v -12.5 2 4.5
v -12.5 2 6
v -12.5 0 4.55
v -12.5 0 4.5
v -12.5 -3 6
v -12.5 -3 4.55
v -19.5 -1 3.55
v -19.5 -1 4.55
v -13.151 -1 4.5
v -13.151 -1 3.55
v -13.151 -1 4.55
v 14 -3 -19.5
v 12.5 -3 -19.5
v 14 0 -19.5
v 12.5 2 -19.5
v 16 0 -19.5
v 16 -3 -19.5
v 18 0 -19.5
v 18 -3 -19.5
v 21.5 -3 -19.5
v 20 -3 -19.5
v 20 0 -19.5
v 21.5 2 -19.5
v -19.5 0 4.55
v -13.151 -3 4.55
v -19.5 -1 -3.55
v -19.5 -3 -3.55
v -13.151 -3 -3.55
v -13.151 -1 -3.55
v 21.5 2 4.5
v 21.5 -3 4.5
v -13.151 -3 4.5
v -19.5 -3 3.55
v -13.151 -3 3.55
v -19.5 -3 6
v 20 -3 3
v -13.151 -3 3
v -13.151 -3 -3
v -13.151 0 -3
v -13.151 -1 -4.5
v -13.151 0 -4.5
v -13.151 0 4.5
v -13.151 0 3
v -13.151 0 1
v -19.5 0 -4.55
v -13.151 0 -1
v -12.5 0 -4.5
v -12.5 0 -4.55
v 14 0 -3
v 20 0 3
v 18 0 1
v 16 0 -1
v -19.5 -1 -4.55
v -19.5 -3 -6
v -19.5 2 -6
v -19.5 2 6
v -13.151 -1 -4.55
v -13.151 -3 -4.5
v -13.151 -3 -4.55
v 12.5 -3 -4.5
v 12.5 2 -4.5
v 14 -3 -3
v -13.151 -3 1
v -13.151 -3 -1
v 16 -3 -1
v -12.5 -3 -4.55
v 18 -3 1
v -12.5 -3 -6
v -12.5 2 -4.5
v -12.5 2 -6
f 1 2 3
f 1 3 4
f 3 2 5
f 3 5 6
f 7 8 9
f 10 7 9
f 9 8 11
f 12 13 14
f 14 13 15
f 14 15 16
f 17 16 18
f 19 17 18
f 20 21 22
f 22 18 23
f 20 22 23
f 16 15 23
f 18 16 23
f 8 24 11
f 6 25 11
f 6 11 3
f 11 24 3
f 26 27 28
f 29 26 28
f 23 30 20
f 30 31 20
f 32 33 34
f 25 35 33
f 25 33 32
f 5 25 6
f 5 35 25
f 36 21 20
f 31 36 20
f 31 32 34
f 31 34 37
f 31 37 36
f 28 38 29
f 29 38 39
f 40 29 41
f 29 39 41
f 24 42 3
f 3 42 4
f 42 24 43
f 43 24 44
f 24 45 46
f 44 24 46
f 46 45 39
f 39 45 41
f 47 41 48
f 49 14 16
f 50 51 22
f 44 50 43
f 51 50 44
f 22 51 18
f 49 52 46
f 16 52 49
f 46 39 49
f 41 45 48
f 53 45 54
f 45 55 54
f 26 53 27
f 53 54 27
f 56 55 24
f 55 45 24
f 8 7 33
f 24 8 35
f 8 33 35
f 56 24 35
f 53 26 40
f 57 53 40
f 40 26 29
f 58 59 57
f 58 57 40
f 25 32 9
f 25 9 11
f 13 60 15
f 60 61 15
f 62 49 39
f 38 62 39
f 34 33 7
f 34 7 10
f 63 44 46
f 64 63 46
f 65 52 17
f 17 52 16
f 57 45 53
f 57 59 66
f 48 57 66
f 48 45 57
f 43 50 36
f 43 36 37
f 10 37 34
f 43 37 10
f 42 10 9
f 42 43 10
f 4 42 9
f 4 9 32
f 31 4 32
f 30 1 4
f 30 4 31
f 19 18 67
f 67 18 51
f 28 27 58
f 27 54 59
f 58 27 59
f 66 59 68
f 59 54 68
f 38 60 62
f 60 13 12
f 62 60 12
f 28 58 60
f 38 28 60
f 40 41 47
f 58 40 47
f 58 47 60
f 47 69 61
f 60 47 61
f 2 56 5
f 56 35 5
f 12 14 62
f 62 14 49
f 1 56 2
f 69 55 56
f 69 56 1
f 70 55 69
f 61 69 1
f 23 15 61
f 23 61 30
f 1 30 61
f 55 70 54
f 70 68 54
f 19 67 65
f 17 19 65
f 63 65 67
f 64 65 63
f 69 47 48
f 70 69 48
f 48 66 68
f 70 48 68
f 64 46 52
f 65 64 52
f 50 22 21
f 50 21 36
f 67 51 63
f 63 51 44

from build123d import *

# Parameters (mm, degrees)
BOSS_EXTRUDE1_DEPTH = 2
SKETCH2_W           = 7
SKETCH2_H           = 1.45
BOSS_EXTRUDE2_DEPTH = 3
SKETCH3_W           = 6.349281592
SKETCH3_H           = 1
BOSS_EXTRUDE3_DEPTH = 2


with BuildPart() as part:
    # Sketch1 → Boss-Extrude1 (new body)
    with BuildSketch(Plane(origin=(0, 0, 0), x_dir=(1, 0, 0), z_dir=(0, 1, 0))):
        Polygon((12.5, -4.5), (21.5, -4.5), (21.5, 19.5), (12.5, 19.5), (12.5, 4.5), (-12.5, 4.5), (-12.5, 6), (-19.5, 6), (-19.5, -6), (-12.5, -6), (-12.5, -4.5), align=None)
    extrude(amount=BOSS_EXTRUDE1_DEPTH)

    # Sketch2 → Boss-Extrude2 (add)
    with BuildSketch(Plane(origin=(0, 0, 0), x_dir=(1, 0, 0), z_dir=(0, 1, 0))):
        Polygon((-13.150718408, 4.5), (12.5, 4.5), (12.5, 19.5), (14, 19.5), (14, 3), (-13.150718408, 3), align=None)
        Polygon((20, 19.5), (20, -3), (-13.150718408, -3), (-13.150718408, -4.5), (21.5, -4.5), (21.5, 19.5), align=None)
        Polygon((-13.150718408, 1), (16, 1), (16, 19.5), (18, 19.5), (18, -1), (-13.150718408, -1), align=None)
        with Locations((-16, 5.275)):
            Rectangle(SKETCH2_W, SKETCH2_H)
        with Locations((-16, -5.275)):
            Rectangle(SKETCH2_W, SKETCH2_H)
    extrude(amount=-BOSS_EXTRUDE2_DEPTH)

    # Sketch3 → Boss-Extrude3 (add)
    with BuildSketch(Plane.XZ.offset(3)):
        with Locations((-16.325359204, 4.05)):
            Rectangle(SKETCH3_W, SKETCH3_H)
        with Locations((-16.325359204, -4.05)):
            Rectangle(SKETCH3_W, SKETCH3_H)
    extrude(amount=-BOSS_EXTRUDE3_DEPTH)


solid = part.part
